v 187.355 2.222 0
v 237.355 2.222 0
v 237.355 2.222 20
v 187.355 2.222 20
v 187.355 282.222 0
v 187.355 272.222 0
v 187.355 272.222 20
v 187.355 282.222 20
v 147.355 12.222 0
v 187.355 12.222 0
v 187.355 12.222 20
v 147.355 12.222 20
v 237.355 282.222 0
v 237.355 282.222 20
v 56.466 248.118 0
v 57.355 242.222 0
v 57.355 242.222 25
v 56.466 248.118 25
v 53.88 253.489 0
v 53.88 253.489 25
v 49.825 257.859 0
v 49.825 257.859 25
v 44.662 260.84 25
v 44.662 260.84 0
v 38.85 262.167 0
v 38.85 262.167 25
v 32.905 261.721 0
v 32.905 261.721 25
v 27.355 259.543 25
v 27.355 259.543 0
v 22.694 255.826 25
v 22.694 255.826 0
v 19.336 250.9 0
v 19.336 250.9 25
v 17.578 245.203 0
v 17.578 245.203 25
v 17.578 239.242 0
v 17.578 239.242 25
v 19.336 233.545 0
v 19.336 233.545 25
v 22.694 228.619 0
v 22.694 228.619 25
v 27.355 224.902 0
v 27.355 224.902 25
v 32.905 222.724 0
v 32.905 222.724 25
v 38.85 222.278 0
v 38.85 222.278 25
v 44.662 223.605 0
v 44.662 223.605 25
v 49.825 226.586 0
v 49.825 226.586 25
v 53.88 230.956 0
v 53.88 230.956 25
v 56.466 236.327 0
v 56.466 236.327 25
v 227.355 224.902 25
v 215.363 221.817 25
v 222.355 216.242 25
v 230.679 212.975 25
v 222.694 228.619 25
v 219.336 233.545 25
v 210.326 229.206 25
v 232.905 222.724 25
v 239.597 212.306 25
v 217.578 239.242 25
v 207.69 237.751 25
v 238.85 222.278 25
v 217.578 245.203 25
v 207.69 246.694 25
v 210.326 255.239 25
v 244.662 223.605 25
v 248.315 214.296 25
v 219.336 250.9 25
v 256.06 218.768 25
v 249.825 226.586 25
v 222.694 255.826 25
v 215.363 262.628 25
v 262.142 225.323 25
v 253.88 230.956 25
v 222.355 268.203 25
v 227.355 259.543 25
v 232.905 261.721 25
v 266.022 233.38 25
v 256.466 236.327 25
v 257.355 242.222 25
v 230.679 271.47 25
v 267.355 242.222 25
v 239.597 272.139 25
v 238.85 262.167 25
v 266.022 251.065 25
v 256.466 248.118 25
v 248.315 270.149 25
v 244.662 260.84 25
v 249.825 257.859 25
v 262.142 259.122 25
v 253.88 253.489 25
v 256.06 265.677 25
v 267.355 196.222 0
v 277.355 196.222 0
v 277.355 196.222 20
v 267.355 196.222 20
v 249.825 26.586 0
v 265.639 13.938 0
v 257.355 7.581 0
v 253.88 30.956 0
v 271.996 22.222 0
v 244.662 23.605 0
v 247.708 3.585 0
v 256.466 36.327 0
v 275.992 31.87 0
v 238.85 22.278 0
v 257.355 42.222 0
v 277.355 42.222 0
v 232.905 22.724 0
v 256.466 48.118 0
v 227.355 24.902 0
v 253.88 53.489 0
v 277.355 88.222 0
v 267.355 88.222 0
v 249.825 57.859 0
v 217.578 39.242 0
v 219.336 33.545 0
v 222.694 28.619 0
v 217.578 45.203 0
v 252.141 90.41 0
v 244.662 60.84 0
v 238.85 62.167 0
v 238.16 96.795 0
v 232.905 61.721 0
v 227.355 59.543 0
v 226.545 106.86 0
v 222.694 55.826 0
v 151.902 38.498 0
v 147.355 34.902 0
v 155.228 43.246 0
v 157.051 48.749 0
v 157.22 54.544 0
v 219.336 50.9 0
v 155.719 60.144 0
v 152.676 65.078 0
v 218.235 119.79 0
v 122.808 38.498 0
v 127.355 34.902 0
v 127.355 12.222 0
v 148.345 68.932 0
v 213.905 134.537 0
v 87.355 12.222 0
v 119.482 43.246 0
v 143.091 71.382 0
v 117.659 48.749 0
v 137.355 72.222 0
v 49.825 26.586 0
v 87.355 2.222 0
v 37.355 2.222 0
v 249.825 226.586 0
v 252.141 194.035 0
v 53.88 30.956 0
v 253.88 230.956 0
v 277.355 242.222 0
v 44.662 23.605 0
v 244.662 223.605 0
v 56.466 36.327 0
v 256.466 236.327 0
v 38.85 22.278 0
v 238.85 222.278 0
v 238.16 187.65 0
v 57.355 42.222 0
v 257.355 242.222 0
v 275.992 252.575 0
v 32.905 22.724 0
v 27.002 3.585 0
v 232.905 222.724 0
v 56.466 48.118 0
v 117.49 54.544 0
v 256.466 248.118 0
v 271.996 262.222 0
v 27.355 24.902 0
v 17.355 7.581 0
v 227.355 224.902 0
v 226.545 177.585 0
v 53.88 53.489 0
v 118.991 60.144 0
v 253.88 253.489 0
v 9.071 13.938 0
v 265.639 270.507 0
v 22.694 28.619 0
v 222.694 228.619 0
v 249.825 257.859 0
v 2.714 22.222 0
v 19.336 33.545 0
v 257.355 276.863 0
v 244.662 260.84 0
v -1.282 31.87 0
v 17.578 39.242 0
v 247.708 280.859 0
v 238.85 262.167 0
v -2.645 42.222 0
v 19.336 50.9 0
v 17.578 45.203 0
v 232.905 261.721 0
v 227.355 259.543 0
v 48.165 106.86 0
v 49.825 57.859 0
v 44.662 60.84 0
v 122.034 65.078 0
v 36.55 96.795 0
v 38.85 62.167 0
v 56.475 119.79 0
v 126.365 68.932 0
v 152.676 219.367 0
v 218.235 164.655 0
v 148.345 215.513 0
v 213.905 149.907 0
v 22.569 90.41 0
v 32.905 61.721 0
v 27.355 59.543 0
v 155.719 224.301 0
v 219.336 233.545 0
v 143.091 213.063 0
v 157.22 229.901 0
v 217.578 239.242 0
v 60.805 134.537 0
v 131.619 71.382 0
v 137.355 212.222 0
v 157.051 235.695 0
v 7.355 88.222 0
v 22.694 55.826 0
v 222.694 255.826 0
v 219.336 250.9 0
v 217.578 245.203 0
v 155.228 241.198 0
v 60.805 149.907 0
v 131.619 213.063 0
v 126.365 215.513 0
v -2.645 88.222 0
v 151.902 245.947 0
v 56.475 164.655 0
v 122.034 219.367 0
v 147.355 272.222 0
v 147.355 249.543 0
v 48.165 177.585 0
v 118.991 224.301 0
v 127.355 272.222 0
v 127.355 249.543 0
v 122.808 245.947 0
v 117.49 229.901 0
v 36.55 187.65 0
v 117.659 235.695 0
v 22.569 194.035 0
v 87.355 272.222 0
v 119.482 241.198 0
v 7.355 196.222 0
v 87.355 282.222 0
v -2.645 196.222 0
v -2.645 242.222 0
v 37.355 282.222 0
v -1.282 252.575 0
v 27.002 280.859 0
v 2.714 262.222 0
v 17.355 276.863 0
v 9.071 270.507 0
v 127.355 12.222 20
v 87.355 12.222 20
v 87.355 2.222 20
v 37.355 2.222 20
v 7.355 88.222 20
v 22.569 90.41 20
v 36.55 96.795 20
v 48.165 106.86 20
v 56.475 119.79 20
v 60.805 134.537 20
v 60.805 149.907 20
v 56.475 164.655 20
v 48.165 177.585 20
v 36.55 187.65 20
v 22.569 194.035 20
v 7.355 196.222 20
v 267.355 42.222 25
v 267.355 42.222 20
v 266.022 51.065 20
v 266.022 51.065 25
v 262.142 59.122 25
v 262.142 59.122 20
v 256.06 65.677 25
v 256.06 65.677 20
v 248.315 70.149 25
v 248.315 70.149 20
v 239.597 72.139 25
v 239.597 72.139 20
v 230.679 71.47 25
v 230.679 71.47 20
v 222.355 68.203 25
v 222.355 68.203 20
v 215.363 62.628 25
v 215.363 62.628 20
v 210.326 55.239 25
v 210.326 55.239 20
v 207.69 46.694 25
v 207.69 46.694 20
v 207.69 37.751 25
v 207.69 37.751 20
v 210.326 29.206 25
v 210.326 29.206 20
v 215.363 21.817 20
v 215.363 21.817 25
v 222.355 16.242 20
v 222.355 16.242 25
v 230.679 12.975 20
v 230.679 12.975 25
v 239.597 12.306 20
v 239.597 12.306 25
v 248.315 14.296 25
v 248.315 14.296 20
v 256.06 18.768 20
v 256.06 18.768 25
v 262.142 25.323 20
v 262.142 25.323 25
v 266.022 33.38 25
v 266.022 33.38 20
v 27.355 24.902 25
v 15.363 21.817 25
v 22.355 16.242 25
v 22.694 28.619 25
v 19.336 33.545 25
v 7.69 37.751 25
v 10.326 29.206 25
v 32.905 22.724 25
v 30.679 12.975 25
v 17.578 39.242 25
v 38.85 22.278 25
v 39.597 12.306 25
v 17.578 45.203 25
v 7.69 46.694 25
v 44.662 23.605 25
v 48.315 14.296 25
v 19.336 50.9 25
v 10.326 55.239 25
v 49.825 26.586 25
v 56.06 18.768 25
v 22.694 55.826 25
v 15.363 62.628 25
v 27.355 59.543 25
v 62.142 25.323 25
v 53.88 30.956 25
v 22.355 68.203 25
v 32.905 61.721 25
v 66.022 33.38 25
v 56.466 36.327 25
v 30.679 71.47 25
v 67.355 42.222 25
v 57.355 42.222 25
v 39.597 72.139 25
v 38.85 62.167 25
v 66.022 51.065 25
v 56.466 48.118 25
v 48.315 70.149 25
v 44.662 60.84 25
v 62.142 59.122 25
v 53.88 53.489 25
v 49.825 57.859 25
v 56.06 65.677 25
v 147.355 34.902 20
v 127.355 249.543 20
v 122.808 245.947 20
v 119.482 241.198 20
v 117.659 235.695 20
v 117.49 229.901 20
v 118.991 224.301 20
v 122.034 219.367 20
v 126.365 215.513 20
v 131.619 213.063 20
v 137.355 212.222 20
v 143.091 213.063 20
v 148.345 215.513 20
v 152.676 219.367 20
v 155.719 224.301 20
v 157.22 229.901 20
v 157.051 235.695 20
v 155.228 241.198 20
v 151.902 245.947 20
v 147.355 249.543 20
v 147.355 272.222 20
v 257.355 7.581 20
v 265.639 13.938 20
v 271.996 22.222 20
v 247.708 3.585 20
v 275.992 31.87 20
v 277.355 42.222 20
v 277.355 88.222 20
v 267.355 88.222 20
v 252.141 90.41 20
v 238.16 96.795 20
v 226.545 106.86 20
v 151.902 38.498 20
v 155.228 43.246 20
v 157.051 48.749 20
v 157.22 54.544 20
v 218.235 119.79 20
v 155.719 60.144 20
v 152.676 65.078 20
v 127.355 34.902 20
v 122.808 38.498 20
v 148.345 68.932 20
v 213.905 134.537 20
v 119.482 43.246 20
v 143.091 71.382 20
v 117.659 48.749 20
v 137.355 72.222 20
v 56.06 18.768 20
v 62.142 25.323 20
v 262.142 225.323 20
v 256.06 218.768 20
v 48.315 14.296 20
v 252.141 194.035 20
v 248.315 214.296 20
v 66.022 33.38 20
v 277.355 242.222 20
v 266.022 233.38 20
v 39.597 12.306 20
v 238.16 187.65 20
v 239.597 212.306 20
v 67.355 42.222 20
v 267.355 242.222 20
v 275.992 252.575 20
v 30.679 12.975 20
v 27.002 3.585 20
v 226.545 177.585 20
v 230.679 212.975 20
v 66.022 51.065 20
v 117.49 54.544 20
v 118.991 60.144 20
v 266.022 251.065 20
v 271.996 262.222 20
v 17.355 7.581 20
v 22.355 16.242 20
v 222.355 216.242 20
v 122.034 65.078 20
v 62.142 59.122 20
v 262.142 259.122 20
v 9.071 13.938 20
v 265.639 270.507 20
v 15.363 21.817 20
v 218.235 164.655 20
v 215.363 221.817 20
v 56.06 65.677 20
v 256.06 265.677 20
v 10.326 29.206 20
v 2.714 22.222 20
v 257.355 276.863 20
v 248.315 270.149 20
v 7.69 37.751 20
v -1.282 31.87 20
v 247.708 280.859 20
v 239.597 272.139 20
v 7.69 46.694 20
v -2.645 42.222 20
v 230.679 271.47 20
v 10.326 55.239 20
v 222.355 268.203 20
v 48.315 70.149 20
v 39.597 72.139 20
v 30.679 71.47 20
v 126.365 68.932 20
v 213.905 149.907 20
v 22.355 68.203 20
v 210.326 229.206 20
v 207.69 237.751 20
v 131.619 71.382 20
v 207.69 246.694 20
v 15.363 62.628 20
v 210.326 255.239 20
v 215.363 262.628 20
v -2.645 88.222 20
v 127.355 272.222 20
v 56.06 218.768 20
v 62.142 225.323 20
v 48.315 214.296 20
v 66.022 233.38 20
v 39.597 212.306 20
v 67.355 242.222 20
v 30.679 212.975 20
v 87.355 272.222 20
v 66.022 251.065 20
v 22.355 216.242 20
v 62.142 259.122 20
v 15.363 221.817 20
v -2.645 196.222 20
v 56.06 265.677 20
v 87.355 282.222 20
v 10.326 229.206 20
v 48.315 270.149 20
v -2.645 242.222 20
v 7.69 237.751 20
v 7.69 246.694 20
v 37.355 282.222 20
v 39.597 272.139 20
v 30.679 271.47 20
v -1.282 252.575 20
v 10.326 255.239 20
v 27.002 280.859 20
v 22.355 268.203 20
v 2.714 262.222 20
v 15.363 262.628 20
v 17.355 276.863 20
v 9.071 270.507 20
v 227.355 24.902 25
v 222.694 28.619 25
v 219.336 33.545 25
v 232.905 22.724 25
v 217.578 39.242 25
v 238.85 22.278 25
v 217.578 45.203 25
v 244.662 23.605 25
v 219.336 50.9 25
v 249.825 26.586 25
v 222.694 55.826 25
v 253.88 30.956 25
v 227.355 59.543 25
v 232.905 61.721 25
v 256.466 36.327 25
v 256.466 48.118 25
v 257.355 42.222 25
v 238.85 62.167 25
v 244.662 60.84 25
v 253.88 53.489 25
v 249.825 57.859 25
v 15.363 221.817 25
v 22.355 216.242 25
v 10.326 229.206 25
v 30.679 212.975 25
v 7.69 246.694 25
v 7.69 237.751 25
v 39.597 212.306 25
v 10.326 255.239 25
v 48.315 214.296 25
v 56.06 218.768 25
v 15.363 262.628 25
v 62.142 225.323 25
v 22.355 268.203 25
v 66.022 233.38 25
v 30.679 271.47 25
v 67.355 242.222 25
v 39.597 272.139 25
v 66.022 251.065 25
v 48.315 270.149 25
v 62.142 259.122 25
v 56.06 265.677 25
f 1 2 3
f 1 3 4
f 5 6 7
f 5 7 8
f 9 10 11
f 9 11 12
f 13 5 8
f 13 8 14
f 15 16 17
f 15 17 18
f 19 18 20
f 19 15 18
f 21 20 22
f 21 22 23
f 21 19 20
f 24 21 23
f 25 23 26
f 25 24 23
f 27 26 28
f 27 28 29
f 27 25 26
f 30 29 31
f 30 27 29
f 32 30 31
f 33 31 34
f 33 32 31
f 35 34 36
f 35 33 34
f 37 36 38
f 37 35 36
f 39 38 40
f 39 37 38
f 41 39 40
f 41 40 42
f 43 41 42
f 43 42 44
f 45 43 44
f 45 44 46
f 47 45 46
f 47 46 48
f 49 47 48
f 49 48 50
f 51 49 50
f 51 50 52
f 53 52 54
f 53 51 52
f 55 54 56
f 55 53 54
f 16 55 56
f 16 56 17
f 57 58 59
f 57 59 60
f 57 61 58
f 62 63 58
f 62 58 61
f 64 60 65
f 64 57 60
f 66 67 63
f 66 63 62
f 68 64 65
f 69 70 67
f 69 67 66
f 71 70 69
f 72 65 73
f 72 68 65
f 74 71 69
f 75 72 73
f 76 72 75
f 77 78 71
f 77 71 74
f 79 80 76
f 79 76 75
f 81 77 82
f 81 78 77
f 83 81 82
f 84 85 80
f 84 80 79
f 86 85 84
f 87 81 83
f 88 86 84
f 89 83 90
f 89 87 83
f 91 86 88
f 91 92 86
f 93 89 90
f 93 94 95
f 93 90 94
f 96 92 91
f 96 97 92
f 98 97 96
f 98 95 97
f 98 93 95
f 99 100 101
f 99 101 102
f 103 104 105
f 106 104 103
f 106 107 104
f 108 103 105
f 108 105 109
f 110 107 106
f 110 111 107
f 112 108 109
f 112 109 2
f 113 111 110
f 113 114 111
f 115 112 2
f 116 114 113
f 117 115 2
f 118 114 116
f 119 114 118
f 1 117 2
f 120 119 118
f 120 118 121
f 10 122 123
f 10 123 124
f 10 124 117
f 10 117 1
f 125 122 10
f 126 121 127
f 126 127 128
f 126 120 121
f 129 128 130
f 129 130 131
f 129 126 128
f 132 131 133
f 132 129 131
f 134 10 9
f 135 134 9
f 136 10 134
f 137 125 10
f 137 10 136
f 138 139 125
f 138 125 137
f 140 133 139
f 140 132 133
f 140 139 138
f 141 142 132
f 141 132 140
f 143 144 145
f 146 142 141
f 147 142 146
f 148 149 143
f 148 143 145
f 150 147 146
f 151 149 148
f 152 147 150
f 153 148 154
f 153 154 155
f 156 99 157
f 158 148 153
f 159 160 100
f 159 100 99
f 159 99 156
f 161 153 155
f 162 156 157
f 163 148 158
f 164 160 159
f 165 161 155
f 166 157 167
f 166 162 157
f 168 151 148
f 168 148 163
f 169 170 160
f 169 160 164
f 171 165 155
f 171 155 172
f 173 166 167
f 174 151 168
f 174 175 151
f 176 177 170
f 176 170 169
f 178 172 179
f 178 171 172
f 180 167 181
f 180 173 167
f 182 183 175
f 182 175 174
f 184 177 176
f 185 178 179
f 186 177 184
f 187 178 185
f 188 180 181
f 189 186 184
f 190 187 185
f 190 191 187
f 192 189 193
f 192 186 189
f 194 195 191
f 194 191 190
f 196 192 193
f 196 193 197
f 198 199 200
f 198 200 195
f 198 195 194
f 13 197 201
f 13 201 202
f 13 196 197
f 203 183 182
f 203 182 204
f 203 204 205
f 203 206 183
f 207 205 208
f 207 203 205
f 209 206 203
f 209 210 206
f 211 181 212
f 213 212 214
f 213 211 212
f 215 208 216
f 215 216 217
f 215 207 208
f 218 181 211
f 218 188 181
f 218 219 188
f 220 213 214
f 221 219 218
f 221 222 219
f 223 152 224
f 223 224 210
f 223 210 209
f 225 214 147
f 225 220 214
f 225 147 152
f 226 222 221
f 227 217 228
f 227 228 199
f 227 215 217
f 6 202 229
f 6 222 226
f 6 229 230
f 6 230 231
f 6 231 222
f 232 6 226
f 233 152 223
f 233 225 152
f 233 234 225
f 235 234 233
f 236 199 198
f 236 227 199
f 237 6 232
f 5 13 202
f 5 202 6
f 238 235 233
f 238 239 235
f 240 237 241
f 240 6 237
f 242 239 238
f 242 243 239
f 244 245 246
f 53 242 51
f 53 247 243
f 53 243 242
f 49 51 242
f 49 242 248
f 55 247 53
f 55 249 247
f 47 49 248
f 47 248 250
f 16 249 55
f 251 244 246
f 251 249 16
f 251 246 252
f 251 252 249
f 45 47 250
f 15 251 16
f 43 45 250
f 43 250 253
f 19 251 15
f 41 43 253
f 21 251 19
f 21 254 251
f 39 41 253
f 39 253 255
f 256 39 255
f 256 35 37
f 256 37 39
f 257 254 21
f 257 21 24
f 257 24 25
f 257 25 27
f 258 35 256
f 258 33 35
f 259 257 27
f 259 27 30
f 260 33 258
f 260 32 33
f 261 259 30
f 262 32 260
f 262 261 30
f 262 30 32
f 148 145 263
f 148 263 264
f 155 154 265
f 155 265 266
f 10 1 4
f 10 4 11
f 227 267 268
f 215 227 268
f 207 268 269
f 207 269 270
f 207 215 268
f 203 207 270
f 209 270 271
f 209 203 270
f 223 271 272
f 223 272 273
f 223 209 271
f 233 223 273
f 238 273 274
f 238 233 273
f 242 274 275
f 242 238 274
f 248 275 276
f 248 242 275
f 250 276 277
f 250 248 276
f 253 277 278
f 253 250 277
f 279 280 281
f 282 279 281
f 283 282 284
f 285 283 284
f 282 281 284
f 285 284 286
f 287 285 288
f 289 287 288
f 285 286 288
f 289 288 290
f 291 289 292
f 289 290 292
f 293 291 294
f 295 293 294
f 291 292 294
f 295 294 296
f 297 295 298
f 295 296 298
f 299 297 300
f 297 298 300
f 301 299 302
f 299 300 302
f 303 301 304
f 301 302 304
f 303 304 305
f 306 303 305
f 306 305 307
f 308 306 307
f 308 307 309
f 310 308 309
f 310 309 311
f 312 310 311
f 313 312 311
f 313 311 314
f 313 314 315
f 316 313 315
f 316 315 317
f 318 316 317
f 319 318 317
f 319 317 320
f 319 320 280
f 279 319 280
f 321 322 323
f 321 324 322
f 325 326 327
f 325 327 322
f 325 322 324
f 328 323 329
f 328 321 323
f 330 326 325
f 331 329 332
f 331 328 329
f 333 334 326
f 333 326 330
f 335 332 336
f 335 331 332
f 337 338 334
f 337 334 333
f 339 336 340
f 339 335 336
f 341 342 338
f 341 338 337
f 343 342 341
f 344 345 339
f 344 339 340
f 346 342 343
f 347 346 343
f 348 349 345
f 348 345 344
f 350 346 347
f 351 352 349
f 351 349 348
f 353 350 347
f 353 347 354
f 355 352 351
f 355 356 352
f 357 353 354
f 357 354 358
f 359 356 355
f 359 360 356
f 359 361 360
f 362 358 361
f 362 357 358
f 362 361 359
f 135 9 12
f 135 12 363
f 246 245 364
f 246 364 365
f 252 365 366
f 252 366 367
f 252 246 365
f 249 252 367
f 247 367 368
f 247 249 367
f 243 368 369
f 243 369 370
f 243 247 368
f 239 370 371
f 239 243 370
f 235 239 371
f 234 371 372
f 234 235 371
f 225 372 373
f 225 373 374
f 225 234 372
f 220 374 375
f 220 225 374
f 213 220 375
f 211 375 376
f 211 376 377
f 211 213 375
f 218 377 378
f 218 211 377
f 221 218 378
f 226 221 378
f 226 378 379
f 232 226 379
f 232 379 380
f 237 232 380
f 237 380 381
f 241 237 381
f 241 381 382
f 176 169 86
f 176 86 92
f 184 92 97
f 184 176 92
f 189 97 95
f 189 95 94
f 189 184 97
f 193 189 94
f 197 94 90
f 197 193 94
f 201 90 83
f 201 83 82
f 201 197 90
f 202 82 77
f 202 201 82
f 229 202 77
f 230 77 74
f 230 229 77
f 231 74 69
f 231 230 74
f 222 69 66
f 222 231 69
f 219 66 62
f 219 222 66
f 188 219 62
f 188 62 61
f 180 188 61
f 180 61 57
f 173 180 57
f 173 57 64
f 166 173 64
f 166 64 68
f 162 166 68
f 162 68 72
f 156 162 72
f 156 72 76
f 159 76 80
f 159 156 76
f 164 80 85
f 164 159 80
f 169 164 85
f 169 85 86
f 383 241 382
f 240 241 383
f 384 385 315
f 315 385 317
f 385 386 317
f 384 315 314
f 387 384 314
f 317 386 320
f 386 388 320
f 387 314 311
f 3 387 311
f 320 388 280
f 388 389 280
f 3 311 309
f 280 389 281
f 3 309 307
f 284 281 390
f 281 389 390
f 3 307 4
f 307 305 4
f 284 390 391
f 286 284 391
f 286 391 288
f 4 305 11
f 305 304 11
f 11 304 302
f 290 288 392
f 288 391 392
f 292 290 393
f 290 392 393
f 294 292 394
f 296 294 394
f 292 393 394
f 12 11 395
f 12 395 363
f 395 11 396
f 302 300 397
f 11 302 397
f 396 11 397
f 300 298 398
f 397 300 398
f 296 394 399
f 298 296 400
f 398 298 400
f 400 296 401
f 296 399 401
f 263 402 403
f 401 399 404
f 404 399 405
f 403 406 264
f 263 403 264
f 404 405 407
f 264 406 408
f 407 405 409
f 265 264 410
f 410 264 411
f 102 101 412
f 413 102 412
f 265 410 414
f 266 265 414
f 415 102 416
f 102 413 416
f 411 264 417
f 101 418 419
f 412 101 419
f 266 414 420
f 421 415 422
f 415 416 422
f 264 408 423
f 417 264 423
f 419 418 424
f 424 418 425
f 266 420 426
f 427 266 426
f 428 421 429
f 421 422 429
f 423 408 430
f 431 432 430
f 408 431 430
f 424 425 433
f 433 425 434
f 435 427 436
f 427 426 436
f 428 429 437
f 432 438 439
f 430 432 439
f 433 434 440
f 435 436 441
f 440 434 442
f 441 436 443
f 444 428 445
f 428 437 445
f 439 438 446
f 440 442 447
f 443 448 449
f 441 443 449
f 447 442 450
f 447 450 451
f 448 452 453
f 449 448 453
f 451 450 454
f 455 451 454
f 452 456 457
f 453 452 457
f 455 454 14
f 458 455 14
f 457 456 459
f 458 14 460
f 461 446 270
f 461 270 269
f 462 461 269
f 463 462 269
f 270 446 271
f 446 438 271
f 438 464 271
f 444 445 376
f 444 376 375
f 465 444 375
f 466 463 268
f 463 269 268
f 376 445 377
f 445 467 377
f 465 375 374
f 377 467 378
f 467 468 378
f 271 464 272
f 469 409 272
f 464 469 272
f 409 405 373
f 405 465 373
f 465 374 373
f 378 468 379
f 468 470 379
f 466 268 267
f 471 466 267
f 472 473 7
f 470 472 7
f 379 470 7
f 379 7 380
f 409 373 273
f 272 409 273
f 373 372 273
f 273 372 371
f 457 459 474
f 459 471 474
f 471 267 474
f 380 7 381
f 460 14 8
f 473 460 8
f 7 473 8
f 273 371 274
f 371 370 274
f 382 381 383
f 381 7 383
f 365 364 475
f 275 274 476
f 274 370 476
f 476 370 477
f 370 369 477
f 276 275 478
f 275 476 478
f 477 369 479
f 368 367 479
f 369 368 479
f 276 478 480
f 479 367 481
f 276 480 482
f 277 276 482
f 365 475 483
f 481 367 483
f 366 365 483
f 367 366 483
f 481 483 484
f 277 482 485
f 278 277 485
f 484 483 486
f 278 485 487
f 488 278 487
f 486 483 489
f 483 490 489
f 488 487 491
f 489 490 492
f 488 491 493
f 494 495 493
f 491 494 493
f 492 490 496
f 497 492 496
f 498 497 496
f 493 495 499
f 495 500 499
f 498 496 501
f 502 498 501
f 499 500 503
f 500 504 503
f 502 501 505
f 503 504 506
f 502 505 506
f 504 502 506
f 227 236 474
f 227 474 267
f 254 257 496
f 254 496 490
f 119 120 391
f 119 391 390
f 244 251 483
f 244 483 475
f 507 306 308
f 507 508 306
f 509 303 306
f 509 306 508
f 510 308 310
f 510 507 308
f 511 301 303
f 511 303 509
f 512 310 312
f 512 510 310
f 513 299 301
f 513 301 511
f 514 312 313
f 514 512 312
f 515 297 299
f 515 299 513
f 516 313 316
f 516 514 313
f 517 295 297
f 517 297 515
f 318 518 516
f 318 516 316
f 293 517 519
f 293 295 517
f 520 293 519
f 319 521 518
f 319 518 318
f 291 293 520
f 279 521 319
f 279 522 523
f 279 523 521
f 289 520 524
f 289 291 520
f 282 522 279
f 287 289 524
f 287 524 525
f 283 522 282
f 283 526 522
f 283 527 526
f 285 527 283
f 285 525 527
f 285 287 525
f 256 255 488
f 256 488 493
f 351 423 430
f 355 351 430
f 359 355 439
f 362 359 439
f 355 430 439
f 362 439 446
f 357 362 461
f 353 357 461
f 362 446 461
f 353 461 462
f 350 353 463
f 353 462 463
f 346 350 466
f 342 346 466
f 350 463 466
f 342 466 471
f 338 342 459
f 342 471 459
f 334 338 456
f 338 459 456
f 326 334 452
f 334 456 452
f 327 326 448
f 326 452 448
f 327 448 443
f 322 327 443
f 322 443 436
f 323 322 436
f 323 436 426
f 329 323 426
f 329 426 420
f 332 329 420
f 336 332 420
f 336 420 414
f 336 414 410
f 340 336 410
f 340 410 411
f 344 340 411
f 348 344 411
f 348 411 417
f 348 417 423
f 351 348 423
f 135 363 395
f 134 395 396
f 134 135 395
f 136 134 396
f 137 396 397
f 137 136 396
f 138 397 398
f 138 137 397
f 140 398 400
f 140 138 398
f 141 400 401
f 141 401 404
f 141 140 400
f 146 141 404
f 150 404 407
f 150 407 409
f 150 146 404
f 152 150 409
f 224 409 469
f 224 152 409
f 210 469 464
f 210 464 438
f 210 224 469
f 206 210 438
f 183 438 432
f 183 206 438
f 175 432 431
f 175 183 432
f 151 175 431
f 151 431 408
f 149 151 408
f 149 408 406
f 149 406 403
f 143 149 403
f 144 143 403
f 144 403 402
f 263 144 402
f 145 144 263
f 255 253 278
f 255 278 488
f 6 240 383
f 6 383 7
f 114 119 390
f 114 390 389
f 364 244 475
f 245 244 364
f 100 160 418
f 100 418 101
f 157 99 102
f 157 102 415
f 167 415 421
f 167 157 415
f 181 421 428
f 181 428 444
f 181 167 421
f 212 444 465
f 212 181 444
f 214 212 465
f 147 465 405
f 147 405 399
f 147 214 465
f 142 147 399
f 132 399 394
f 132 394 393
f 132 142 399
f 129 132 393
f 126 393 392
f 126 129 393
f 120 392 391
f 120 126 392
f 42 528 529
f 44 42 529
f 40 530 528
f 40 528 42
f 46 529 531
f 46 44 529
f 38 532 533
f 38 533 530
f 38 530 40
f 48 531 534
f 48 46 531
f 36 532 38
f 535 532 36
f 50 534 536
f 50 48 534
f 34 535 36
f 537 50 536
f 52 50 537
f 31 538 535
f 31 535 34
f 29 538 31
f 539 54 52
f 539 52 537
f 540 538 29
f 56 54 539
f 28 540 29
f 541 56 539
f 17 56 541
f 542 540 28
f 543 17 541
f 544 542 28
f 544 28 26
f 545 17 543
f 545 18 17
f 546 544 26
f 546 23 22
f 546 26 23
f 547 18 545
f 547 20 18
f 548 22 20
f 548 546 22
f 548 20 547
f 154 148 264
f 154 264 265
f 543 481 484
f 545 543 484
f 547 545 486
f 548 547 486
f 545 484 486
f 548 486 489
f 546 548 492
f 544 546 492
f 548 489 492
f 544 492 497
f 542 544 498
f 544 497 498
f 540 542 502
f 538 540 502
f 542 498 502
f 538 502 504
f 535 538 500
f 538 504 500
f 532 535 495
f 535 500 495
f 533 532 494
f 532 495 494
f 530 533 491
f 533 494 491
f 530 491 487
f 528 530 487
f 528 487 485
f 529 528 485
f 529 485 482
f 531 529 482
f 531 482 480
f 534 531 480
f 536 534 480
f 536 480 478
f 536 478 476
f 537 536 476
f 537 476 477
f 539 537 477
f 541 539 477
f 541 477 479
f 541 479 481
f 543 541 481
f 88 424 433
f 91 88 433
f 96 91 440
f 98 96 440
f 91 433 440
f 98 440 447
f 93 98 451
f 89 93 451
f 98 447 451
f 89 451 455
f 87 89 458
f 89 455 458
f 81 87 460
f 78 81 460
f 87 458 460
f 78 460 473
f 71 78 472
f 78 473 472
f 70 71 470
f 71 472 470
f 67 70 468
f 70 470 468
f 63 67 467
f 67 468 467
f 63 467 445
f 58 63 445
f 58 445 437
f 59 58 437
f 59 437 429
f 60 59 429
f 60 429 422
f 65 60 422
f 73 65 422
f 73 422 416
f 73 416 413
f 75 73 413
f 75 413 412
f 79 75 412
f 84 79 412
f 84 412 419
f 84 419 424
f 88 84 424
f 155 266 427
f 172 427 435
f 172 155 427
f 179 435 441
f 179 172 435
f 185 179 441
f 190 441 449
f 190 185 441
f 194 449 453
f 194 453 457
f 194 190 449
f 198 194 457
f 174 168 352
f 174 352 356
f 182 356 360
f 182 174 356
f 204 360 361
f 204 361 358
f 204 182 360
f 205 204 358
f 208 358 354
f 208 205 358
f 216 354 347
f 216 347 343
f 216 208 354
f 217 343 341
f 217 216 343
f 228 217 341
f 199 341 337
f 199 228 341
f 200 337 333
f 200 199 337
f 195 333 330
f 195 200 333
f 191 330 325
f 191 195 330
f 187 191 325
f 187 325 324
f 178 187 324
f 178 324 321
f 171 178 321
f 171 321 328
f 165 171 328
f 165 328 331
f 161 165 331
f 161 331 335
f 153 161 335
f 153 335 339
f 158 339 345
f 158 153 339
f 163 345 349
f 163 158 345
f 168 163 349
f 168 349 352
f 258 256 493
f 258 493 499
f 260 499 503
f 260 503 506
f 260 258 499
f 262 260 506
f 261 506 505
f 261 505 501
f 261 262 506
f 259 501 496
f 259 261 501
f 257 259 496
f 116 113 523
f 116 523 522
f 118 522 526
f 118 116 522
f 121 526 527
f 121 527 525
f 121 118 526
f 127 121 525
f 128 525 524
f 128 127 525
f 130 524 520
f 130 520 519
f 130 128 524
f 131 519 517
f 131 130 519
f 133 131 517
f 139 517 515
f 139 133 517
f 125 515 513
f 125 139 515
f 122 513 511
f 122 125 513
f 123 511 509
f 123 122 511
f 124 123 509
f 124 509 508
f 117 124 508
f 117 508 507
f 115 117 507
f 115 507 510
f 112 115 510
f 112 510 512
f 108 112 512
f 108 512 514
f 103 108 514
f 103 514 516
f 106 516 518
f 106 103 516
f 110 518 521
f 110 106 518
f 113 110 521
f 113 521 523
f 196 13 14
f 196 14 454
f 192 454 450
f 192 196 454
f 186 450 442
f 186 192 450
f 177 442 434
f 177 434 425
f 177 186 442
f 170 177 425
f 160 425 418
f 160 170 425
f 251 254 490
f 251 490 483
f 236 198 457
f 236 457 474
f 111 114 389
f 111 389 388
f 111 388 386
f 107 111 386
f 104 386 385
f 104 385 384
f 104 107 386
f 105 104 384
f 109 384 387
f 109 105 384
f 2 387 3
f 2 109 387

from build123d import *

# Parameters (mm, degrees)
SKETCH2_R           = 30
BOSS_EXTRUDE2_DEPTH = 20
SKETCH2_5_R         = 30
SKETCH2_5_R_2       = 20
BOSS_EXTRUDE3_DEPTH = 25


with BuildPart() as part:
    # Sketch2 → Boss-Extrude2 (new body)
    with BuildSketch(Plane.XY):
        with BuildLine():
            ThreePointArc((-2.644987214, 42.222447728), (9.070741539, 13.938176481), (37.355012786, 2.222447728))
            Line((37.355012786, 2.222447728), (87.355012786, 2.222447728))
            Line((87.355012786, 2.222447728), (87.355012786, 12.222447728))
            Line((87.355012786, 12.222447728), (127.355012786, 12.222447728))
            Line((127.355012786, 12.222447728), (127.355012786, 34.901939653))
            ThreePointArc((127.355012786, 34.901939653), (137.355012786, 72.222447728), (147.355012786, 34.901939653))
            Line((147.355012786, 34.901939653), (147.355012786, 12.222447728))
            Line((147.355012786, 12.222447728), (187.355012786, 12.222447728))
            Line((187.355012786, 12.222447728), (187.355012786, 2.222447728))
            Line((187.355012786, 2.222447728), (237.355012786, 2.222447728))
            ThreePointArc((237.355012786, 2.222447728), (265.639284034, 13.938176481), (277.355012786, 42.222447728))
            Line((277.355012786, 42.222447728), (277.355012786, 88.222447728))
            Line((277.355012786, 88.222447728), (267.355012786, 88.222447728))
            ThreePointArc((267.355012786, 88.222447728), (213.355012786, 142.222447728), (267.355012786, 196.222447728))
            Line((267.355012786, 196.222447728), (277.355012786, 196.222447728))
            Line((277.355012786, 196.222447728), (277.355012786, 242.222447728))
            ThreePointArc((277.355012786, 242.222447728), (265.639284034, 270.506718976), (237.355012786, 282.222447728))
            Line((237.355012786, 282.222447728), (187.355012786, 282.222447728))
            Line((187.355012786, 282.222447728), (187.355012786, 272.222447728))
            Line((187.355012786, 272.222447728), (147.355012786, 272.222447728))
            Line((147.355012786, 272.222447728), (147.355012786, 249.542955804))
            ThreePointArc((147.355012786, 249.542955804), (137.355012786, 212.222447728), (127.355012786, 249.542955804))
            Line((127.355012786, 249.542955804), (127.355012786, 272.222447728))
            Line((127.355012786, 272.222447728), (87.355012786, 272.222447728))
            Line((87.355012786, 272.222447728), (87.355012786, 282.222447728))
            Line((87.355012786, 282.222447728), (37.355012786, 282.222447728))
            ThreePointArc((37.355012786, 282.222447728), (9.070741539, 270.506718976), (-2.644987214, 242.222447728))
            Line((-2.644987214, 242.222447728), (-2.644987214, 196.222447728))
            Line((-2.644987214, 196.222447728), (7.355012786, 196.222447728))
            ThreePointArc((7.355012786, 196.222447728), (61.355012786, 142.222447728), (7.355012786, 88.222447728))
            Line((7.355012786, 88.222447728), (-2.644987214, 88.222447728))
            Line((-2.644987214, 88.222447728), (-2.644987214, 42.222447728))
        make_face()
        with Locations((37.355012786, 42.222447728)):
            Circle(SKETCH2_R, mode=Mode.SUBTRACT)
        with Locations((237.355012786, 42.222447728)):
            Circle(SKETCH2_R, mode=Mode.SUBTRACT)
        with Locations((37.355012786, 242.222447728)):
            Circle(SKETCH2_R, mode=Mode.SUBTRACT)
        with Locations((237.355012786, 242.222447728)):
            Circle(SKETCH2_R, mode=Mode.SUBTRACT)
    extrude(amount=BOSS_EXTRUDE2_DEPTH)

    # Sketch2<5> → Boss-Extrude3 (add)
    # profile 1 of 4: a face of its own
    with BuildSketch(Plane.XY):
        with Locations((37.355012786, 242.222447728)):
            Circle(SKETCH2_5_R)
        with Locations((37.355012786, 242.222447728)):
            Circle(SKETCH2_5_R_2, mode=Mode.SUBTRACT)
    # profile 2 of 4: a face of its own
    with BuildSketch(Plane.XY):
        with Locations((37.355012786, 42.222447728)):
            Circle(SKETCH2_5_R)
        with Locations((37.355012786, 42.222447728)):
            Circle(SKETCH2_5_R_2, mode=Mode.SUBTRACT)
    # profile 3 of 4: a face of its own
    with BuildSketch(Plane.XY):
        with Locations((237.355012786, 42.222447728)):
            Circle(SKETCH2_5_R)
        with Locations((237.355012786, 42.222447728)):
            Circle(SKETCH2_5_R_2, mode=Mode.SUBTRACT)
    # profile 4 of 4: a face of its own
    with BuildSketch(Plane.XY):
        with Locations((237.355012786, 242.222447728)):
            Circle(SKETCH2_5_R)
        with Locations((237.355012786, 242.222447728)):
            Circle(SKETCH2_5_R_2, mode=Mode.SUBTRACT)
    extrude(amount=BOSS_EXTRUDE3_DEPTH)


solid = part.part
